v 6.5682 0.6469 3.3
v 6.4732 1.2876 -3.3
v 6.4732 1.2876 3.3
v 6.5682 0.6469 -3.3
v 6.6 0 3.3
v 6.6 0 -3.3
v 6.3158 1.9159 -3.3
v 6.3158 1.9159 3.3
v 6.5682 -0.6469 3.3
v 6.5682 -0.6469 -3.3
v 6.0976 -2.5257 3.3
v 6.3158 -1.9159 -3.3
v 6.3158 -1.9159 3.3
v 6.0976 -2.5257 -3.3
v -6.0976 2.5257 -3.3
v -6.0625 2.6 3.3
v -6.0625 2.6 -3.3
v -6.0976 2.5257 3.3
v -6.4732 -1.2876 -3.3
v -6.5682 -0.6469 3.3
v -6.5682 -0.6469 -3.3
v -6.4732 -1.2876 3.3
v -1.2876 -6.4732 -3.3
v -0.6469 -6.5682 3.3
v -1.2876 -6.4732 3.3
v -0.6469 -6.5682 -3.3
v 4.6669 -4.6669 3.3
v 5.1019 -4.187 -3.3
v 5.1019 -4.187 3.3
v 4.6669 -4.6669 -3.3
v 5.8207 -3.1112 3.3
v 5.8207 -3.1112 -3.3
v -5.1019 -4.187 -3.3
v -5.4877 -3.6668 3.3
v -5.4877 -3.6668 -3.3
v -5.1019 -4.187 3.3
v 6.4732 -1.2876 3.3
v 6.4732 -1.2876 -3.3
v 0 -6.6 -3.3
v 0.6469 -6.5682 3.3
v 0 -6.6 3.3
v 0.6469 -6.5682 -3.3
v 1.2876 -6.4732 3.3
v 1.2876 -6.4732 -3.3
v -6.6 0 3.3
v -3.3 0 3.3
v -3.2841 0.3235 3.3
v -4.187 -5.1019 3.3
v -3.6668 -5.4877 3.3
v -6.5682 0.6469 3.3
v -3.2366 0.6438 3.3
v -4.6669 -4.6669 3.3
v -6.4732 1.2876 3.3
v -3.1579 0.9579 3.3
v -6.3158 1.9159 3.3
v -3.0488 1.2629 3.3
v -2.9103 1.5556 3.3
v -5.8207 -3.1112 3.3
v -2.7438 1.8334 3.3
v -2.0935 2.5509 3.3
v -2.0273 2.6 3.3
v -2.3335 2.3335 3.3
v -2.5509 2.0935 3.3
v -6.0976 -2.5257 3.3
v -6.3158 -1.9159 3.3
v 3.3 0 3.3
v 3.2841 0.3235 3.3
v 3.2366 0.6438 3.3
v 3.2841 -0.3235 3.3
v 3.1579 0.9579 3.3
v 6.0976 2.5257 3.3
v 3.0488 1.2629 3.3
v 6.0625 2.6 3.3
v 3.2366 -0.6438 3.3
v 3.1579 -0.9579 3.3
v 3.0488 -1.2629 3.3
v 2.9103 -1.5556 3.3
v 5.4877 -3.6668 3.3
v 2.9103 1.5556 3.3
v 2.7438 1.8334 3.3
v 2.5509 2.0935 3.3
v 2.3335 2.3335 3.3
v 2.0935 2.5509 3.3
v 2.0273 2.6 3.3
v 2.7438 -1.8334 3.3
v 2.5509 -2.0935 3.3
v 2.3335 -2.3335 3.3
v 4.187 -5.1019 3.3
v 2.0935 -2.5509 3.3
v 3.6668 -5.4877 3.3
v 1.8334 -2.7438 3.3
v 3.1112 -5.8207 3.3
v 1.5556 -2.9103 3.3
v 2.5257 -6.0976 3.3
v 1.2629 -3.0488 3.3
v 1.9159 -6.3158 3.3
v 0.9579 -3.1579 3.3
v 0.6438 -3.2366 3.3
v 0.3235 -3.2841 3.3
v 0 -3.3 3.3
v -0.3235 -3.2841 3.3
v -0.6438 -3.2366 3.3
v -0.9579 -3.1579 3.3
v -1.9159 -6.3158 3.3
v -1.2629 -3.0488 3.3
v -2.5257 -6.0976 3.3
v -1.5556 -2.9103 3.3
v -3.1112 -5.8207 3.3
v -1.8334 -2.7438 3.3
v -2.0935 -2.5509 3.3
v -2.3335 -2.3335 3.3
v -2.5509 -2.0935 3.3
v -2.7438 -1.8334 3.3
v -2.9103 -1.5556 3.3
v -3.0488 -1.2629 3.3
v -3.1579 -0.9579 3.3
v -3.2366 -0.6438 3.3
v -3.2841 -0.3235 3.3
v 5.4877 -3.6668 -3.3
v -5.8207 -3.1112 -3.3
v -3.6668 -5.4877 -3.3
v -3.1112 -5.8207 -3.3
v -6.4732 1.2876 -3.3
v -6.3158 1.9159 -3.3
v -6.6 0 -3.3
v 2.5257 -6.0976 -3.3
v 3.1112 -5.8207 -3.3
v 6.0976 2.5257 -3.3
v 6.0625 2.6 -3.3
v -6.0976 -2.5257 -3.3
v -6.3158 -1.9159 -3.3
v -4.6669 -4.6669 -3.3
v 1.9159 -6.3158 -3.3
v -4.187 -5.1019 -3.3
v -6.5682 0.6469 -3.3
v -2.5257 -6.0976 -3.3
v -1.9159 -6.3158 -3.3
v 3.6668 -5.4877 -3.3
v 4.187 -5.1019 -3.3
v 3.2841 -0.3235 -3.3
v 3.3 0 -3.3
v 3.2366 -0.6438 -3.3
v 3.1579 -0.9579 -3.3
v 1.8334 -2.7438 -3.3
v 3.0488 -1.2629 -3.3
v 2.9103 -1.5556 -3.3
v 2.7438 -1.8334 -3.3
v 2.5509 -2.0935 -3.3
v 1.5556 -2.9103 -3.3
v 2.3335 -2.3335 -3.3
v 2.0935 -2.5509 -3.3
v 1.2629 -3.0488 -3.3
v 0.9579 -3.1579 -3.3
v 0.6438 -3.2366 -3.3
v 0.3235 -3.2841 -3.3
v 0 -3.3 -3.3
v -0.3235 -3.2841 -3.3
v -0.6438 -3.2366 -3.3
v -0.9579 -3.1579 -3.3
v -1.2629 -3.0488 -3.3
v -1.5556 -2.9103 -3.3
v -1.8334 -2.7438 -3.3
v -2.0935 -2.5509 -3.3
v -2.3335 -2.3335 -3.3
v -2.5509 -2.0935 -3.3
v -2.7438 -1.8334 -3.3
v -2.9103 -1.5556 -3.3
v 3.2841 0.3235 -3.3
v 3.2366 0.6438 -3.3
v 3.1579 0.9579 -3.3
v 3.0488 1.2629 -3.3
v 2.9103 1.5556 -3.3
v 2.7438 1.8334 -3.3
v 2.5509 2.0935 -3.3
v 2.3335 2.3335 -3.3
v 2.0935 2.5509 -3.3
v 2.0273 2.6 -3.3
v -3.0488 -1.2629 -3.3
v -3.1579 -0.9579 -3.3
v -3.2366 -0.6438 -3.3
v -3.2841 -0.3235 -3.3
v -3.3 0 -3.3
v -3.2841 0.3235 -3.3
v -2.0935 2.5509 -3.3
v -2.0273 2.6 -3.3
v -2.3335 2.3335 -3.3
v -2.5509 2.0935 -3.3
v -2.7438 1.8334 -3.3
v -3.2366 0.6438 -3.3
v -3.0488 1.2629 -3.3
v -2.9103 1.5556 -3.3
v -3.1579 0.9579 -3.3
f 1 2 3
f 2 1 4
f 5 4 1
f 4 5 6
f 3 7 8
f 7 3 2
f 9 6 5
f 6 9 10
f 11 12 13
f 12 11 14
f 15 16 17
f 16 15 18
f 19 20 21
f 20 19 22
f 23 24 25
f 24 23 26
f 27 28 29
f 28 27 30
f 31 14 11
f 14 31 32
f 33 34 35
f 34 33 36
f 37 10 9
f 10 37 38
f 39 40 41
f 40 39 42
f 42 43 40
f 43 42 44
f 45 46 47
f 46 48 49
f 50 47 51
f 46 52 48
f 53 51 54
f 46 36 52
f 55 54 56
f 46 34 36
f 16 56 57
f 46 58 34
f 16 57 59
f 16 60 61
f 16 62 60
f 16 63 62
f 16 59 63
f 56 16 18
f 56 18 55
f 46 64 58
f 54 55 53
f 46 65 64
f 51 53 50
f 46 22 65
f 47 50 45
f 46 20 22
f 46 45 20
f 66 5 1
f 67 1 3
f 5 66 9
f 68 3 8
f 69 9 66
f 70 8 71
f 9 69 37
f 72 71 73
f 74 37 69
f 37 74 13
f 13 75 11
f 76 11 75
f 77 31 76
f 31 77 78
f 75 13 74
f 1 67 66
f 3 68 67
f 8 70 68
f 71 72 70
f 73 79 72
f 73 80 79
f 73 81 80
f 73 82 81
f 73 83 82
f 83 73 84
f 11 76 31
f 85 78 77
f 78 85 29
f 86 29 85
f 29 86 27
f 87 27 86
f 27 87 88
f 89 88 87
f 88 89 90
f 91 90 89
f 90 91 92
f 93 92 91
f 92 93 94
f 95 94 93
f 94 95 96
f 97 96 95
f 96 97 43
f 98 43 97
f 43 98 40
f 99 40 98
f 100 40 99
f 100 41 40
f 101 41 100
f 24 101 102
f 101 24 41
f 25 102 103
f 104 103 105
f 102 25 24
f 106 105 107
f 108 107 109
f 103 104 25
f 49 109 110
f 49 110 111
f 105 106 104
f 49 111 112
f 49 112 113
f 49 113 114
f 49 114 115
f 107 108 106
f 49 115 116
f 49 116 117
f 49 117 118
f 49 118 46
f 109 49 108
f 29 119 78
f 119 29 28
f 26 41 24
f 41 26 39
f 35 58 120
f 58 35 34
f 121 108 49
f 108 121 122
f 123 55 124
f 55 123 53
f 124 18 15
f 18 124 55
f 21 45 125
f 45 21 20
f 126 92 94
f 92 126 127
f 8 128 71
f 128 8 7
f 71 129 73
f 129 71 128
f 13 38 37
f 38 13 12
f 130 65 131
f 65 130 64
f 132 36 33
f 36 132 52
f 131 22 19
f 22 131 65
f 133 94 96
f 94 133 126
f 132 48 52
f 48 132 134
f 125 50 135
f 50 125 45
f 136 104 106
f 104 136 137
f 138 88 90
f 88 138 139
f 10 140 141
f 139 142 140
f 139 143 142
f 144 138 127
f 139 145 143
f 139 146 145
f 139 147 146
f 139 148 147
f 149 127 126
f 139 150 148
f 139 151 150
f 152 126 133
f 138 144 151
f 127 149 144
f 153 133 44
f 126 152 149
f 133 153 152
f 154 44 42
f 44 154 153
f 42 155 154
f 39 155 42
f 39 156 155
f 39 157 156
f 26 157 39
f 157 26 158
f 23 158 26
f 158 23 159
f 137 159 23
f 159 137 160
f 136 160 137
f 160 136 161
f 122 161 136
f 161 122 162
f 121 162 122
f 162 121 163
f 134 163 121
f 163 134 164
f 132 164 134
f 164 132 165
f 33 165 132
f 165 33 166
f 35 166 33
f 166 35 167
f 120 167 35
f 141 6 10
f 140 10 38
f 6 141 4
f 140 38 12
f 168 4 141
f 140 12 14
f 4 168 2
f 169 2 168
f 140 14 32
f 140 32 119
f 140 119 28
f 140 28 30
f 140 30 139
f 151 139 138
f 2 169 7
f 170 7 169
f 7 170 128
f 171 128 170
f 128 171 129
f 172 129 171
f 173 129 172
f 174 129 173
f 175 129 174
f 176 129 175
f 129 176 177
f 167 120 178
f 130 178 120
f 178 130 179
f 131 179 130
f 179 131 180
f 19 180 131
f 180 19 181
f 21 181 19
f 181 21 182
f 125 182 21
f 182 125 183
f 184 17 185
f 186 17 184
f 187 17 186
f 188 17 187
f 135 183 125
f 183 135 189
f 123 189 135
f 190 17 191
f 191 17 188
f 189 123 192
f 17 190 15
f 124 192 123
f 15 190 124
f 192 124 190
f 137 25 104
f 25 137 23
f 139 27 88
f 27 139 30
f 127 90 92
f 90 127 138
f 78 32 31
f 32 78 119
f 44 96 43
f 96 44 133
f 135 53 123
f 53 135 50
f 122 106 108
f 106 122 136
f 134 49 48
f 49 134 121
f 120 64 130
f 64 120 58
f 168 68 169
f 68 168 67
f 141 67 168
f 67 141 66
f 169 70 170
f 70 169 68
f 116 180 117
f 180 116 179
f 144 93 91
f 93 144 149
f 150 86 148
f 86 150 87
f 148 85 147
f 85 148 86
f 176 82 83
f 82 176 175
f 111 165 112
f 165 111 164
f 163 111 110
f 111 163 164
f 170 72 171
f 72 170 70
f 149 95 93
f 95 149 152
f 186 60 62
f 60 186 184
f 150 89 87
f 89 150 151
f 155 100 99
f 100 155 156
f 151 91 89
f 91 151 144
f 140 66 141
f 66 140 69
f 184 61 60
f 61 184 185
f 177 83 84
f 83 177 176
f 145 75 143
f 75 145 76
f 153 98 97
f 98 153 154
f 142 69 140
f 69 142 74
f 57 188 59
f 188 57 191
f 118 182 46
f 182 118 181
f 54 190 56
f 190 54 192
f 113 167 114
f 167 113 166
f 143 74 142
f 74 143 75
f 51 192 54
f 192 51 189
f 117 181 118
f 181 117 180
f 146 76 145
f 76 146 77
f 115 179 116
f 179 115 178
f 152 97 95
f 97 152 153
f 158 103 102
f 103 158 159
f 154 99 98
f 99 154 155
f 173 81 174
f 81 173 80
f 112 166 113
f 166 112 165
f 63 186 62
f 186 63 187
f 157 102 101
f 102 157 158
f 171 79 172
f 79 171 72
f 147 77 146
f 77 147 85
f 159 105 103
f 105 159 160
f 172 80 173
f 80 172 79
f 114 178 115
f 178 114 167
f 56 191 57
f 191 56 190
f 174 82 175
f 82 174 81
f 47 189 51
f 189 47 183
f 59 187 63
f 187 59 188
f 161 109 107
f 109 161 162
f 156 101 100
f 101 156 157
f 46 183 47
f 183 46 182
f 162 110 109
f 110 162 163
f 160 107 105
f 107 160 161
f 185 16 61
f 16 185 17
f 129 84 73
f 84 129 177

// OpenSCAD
// COBRA Vertebra - T10 V16
// Height: 6.6000000000000005mm, OD: 13.200000000000001mm

$fn = 64;

difference() {
    // Outer cylinder
    cylinder(h=6.6000000000000005, d=13.200000000000001, center=true);
    
    // Inner channel
    cylinder(h=8.600000000000001, d=6.6000000000000005, center=true);

    // Solar panel cavity
    translate([0, 4.6000000000000005, 0])
    cube([50, 4, 30], center=true);

    // Pivot holes
    translate([0, 6.6000000000000005, 0.30000000000000027])
    rotate([90, 0, 0])
    cylinder(h=5.300000000000001, d=4, center=true);
    
    translate([0, 6.6000000000000005, -0.30000000000000027])
    rotate([90, 0, 0])
    cylinder(h=5.300000000000001, d=4, center=true);
}
